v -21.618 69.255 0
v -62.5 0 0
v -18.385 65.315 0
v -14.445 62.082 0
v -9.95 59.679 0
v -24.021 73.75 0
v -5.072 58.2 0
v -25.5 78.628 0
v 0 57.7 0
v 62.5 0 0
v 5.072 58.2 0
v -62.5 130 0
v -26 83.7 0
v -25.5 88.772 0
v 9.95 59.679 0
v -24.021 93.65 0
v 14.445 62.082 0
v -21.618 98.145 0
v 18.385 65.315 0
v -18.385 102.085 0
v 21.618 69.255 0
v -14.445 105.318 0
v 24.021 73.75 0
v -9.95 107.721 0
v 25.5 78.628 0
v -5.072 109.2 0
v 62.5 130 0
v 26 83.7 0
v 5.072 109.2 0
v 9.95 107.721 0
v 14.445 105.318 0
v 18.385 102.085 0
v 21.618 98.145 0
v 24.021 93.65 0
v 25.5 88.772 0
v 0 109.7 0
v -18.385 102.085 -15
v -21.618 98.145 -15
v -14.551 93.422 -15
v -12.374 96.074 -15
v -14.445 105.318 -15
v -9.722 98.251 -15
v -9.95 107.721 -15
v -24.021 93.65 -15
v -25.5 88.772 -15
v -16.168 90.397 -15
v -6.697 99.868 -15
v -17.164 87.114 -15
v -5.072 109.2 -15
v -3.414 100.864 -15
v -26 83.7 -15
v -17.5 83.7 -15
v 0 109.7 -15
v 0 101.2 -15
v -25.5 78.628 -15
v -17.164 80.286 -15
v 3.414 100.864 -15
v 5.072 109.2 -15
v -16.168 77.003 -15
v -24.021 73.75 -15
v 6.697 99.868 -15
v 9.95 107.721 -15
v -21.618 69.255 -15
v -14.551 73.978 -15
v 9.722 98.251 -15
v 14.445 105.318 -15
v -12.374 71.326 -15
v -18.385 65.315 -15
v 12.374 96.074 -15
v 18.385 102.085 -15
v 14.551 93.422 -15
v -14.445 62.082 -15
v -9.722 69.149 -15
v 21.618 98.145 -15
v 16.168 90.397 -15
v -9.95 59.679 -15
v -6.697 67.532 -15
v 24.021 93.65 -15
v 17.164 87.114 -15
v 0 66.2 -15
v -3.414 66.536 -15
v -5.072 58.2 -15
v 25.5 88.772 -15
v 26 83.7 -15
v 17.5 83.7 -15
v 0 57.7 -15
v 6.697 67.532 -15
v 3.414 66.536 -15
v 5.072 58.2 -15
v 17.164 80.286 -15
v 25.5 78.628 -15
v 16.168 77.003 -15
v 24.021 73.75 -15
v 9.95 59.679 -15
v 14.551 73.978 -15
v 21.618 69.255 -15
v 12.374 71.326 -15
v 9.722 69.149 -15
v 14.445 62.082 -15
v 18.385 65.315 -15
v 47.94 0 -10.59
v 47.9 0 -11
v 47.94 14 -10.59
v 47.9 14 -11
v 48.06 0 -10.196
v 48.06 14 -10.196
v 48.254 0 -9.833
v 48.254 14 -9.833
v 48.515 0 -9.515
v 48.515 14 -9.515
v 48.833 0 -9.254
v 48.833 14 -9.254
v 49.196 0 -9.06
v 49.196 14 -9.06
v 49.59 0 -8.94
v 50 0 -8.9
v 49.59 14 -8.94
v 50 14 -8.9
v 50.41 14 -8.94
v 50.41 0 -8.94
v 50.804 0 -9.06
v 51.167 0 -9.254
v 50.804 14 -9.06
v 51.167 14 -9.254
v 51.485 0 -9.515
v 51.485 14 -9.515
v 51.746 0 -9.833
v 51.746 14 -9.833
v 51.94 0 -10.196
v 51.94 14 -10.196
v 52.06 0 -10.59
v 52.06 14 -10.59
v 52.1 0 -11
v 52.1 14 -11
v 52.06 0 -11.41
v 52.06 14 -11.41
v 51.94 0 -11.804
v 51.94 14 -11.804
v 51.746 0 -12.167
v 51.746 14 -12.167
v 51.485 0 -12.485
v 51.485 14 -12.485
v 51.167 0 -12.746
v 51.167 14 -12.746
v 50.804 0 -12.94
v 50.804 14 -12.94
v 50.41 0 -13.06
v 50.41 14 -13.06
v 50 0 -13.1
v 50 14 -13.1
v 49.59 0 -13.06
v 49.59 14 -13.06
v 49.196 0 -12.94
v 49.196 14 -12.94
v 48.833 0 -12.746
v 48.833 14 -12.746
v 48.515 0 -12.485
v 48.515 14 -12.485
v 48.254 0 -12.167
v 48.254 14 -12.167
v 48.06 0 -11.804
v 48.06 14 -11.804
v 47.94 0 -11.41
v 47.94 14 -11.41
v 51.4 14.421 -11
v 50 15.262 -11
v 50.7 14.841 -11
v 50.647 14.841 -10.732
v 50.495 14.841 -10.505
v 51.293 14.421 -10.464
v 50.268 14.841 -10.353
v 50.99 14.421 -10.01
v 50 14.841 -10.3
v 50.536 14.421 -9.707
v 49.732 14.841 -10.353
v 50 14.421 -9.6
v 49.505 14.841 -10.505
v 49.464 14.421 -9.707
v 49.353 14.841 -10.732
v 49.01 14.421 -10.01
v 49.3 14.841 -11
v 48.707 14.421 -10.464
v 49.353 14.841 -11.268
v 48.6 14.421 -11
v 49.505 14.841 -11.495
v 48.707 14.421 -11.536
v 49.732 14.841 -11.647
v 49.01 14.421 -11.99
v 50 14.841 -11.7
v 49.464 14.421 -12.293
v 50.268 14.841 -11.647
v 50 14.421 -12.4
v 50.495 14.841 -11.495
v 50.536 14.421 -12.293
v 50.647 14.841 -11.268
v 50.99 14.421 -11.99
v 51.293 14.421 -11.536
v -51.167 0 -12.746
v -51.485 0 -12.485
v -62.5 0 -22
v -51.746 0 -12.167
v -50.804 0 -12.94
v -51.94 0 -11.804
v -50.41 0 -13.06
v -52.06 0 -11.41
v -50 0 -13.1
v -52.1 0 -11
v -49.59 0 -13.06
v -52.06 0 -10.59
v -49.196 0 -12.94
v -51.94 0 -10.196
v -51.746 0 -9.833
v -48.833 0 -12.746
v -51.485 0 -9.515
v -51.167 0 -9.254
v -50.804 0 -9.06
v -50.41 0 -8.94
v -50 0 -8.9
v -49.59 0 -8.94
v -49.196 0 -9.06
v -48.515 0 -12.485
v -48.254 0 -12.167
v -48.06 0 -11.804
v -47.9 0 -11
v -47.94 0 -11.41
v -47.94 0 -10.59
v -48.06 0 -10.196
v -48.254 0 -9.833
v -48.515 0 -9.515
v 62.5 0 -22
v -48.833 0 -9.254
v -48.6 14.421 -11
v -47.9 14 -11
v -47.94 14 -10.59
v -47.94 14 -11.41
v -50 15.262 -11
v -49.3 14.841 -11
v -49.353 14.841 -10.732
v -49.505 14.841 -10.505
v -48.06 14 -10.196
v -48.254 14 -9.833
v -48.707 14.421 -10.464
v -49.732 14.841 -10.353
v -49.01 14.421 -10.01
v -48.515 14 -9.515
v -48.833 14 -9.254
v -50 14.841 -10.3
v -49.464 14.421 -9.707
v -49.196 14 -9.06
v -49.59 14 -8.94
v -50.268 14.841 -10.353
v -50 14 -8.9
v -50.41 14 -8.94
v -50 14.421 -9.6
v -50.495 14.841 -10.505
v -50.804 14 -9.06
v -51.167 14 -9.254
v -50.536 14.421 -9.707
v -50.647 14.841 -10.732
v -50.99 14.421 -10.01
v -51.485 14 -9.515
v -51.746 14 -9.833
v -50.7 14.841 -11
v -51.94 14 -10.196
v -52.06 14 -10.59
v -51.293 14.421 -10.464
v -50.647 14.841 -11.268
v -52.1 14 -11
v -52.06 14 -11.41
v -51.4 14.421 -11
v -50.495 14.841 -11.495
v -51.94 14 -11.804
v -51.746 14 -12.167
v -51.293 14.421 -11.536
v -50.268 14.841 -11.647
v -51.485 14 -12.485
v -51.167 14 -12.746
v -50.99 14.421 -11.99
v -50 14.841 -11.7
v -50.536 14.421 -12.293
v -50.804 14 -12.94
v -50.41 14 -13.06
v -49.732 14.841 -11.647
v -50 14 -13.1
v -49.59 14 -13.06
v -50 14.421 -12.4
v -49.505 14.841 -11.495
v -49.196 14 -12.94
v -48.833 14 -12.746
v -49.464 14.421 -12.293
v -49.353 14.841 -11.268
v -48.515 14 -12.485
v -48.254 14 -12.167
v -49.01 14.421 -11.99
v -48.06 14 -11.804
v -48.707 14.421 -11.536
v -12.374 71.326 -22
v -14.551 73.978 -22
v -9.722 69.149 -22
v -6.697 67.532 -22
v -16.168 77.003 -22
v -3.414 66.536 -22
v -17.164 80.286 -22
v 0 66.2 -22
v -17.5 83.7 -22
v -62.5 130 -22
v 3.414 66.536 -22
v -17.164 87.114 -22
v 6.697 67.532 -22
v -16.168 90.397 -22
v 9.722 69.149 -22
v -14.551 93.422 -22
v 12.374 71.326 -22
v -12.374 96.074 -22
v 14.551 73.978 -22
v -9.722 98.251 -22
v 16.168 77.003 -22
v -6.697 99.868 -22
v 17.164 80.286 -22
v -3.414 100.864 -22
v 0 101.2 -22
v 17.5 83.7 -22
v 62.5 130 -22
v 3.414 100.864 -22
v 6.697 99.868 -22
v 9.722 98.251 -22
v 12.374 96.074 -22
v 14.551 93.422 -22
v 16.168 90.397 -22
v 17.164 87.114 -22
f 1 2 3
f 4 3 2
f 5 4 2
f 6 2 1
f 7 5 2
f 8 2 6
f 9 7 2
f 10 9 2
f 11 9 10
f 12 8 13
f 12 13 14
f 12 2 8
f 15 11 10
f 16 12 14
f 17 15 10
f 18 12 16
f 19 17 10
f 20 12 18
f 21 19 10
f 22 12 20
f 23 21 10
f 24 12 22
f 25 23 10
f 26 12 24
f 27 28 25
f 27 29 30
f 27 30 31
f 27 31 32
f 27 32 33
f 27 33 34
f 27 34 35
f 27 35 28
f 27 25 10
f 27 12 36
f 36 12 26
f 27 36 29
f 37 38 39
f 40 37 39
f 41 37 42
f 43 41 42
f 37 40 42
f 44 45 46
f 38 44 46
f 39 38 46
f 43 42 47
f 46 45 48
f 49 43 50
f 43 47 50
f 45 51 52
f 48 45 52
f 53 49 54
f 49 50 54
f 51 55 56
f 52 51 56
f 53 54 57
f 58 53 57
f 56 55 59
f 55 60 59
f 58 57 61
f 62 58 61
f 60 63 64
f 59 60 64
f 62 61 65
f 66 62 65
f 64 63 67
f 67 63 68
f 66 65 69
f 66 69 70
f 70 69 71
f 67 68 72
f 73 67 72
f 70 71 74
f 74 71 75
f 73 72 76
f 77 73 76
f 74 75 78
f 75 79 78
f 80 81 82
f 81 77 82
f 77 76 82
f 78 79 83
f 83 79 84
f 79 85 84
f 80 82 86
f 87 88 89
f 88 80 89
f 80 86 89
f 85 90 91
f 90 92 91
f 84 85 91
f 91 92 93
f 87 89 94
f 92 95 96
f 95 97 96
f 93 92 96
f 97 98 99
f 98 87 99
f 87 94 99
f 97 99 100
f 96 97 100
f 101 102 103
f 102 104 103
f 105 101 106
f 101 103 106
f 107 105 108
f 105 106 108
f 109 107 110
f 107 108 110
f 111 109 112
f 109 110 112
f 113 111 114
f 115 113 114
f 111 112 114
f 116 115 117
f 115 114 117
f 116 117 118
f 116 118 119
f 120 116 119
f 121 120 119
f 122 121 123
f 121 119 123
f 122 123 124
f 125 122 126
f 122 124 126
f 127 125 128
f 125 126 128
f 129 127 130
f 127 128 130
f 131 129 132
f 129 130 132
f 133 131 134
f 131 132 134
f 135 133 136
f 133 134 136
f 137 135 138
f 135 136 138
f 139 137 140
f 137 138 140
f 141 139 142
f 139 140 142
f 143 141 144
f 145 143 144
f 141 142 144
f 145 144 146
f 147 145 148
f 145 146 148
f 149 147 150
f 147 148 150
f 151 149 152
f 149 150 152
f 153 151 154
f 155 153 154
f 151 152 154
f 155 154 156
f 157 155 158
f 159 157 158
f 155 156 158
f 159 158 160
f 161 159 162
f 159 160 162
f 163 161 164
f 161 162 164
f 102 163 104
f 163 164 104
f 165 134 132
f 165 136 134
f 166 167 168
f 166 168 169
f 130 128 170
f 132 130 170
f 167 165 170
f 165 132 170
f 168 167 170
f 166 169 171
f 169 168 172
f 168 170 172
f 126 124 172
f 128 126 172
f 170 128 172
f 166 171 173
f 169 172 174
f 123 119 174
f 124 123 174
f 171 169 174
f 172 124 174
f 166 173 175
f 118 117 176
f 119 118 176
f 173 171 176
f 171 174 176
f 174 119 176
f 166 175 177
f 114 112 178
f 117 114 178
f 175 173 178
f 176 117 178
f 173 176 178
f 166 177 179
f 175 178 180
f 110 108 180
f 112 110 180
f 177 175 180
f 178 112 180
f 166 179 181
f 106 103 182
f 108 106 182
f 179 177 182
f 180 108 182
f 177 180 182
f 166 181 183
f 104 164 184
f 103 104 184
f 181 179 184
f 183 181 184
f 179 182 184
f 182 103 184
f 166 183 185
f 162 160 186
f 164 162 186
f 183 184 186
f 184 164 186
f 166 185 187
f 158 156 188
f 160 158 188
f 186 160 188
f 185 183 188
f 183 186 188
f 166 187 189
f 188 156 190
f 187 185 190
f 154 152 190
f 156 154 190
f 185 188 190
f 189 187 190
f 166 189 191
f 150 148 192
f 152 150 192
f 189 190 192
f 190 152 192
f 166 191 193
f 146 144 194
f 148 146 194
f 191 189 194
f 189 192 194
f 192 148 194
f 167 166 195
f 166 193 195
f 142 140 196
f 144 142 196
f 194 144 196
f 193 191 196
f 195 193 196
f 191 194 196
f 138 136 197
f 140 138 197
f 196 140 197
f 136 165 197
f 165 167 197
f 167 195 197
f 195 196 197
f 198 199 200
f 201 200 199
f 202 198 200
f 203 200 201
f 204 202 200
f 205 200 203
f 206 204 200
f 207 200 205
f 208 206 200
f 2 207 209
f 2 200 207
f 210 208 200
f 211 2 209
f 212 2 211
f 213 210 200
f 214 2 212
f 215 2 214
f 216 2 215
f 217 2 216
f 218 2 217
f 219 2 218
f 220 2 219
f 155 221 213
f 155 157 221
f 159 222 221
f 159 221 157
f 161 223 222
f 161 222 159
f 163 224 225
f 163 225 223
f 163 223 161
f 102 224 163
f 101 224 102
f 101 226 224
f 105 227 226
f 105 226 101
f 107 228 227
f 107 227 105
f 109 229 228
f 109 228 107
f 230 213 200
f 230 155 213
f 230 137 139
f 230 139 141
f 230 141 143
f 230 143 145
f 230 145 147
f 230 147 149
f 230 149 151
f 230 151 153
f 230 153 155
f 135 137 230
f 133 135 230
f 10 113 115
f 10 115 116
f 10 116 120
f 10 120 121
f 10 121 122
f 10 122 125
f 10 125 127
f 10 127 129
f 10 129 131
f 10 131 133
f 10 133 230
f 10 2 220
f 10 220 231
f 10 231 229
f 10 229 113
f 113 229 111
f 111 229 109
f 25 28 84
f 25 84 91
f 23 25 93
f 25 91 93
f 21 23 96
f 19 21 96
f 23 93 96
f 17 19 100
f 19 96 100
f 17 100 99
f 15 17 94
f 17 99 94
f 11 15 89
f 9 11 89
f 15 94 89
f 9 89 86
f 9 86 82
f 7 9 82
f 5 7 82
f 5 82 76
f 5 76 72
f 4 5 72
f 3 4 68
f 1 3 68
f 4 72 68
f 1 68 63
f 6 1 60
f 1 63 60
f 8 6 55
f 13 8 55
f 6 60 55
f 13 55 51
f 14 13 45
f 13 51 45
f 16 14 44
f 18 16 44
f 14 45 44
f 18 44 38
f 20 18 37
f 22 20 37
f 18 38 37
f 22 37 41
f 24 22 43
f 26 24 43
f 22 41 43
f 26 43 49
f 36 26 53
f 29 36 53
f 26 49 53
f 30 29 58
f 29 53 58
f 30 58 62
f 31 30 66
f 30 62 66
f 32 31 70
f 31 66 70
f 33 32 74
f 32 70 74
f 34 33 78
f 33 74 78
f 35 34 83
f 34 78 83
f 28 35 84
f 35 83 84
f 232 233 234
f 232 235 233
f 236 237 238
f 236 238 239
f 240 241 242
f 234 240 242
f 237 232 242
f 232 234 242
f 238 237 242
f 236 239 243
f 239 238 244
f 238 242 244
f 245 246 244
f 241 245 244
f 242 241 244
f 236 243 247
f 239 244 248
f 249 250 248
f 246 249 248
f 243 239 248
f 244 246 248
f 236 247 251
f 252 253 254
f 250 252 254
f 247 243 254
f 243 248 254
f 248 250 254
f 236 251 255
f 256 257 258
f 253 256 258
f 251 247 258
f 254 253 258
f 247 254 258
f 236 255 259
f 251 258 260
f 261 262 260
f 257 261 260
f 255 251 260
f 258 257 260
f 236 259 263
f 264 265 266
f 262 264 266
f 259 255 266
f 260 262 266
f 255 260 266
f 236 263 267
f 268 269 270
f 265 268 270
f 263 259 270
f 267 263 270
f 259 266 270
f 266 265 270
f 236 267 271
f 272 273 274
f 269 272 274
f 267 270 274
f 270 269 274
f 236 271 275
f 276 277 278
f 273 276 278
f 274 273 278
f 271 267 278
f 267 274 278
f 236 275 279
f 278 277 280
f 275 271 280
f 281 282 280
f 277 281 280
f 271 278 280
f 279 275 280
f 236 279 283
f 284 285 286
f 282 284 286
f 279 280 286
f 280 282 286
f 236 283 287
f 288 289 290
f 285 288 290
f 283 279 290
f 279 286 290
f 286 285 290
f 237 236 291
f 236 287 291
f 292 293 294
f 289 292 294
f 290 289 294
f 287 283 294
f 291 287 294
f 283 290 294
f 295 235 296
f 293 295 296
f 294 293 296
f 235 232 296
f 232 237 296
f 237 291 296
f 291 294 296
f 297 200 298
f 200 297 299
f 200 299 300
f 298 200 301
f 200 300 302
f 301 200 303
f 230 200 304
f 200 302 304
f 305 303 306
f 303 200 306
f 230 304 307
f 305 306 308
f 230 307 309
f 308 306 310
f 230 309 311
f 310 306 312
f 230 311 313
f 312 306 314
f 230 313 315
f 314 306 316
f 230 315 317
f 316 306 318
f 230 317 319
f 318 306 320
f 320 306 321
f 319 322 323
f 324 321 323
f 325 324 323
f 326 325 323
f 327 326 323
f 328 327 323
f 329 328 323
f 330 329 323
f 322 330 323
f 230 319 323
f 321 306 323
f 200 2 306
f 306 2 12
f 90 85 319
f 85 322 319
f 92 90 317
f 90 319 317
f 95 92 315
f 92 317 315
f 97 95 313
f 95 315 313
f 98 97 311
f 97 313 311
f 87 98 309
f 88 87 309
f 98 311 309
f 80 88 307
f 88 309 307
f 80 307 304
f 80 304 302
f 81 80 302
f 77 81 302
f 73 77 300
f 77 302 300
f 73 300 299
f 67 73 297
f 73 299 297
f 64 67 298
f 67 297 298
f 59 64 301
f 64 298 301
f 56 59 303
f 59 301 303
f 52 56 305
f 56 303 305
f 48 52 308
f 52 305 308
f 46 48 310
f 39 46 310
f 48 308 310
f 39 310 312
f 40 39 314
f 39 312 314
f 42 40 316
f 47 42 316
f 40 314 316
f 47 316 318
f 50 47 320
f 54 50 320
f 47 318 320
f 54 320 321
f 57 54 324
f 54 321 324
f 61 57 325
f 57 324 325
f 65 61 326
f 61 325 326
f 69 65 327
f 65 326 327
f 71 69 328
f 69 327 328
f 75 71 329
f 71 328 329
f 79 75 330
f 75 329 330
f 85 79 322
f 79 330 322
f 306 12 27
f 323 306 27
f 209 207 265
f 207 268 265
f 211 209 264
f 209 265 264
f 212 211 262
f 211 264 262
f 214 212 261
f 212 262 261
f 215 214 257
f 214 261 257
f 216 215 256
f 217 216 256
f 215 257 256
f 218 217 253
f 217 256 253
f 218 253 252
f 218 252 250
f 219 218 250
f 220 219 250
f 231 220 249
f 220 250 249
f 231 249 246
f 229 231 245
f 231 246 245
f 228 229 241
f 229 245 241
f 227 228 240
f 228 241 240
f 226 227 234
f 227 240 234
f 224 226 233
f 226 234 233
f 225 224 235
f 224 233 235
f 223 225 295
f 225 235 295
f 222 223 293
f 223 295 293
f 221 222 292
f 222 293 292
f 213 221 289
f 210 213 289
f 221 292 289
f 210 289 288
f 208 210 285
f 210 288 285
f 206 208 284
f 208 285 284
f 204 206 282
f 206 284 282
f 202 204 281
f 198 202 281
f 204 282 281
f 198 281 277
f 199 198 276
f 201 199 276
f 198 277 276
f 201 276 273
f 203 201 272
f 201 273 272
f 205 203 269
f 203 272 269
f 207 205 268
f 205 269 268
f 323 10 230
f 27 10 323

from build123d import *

# Parameters (mm, degrees)
SKETCH1_W                 = 125
SKETCH1_H                 = 130
BOSS_EXTRUDE1_DEPTH       = 22
M5X0_8_TAPPED_HOLE1_D     = 4.2
M5X0_8_TAPPED_HOLE1_DEPTH = 14
M5X0_8_TAPPED_HOLE1_TIP   = 1.2618073


with BuildPart() as part:
    # Sketch1 → Boss-Extrude1 (new body)
    with BuildSketch(Plane.XY):
        with Locations((0, 65)):
            Rectangle(SKETCH1_W, SKETCH1_H)
    extrude(amount=-BOSS_EXTRUDE1_DEPTH)

    # Sketch2 → Cut-Revolve1 (revolve, cut)
    with BuildSketch(Plane(origin=(0, 0, 0), x_dir=(0, 0, -1), z_dir=(1, 0, 0)), mode=Mode.PRIVATE) as cut_revolve1_sk:
        Polygon((0, 109.7), (15, 109.7), (15, 101.2), (22, 101.2), (22, 83.7), (0, 83.7), align=None)
    revolve(cut_revolve1_sk.sketch.rotate(Axis((0, 83.7, 6.088066236), (0, 0, -1)), 90), axis=Axis((0, 83.7, 6.088066236), (0, 0, -1)), mode=Mode.SUBTRACT)

    # M5x0.8 Tapped Hole1
    with Locations(Plane.XZ):
        with Locations((-50, -11), (50, -11)):
            Hole(M5X0_8_TAPPED_HOLE1_D / 2, depth=M5X0_8_TAPPED_HOLE1_DEPTH)
            with Locations((0, 0, -(M5X0_8_TAPPED_HOLE1_DEPTH + M5X0_8_TAPPED_HOLE1_TIP / 2))):  # 118° drill point
                Cone(0, M5X0_8_TAPPED_HOLE1_D / 2, M5X0_8_TAPPED_HOLE1_TIP, mode=Mode.SUBTRACT)


solid = part.part
